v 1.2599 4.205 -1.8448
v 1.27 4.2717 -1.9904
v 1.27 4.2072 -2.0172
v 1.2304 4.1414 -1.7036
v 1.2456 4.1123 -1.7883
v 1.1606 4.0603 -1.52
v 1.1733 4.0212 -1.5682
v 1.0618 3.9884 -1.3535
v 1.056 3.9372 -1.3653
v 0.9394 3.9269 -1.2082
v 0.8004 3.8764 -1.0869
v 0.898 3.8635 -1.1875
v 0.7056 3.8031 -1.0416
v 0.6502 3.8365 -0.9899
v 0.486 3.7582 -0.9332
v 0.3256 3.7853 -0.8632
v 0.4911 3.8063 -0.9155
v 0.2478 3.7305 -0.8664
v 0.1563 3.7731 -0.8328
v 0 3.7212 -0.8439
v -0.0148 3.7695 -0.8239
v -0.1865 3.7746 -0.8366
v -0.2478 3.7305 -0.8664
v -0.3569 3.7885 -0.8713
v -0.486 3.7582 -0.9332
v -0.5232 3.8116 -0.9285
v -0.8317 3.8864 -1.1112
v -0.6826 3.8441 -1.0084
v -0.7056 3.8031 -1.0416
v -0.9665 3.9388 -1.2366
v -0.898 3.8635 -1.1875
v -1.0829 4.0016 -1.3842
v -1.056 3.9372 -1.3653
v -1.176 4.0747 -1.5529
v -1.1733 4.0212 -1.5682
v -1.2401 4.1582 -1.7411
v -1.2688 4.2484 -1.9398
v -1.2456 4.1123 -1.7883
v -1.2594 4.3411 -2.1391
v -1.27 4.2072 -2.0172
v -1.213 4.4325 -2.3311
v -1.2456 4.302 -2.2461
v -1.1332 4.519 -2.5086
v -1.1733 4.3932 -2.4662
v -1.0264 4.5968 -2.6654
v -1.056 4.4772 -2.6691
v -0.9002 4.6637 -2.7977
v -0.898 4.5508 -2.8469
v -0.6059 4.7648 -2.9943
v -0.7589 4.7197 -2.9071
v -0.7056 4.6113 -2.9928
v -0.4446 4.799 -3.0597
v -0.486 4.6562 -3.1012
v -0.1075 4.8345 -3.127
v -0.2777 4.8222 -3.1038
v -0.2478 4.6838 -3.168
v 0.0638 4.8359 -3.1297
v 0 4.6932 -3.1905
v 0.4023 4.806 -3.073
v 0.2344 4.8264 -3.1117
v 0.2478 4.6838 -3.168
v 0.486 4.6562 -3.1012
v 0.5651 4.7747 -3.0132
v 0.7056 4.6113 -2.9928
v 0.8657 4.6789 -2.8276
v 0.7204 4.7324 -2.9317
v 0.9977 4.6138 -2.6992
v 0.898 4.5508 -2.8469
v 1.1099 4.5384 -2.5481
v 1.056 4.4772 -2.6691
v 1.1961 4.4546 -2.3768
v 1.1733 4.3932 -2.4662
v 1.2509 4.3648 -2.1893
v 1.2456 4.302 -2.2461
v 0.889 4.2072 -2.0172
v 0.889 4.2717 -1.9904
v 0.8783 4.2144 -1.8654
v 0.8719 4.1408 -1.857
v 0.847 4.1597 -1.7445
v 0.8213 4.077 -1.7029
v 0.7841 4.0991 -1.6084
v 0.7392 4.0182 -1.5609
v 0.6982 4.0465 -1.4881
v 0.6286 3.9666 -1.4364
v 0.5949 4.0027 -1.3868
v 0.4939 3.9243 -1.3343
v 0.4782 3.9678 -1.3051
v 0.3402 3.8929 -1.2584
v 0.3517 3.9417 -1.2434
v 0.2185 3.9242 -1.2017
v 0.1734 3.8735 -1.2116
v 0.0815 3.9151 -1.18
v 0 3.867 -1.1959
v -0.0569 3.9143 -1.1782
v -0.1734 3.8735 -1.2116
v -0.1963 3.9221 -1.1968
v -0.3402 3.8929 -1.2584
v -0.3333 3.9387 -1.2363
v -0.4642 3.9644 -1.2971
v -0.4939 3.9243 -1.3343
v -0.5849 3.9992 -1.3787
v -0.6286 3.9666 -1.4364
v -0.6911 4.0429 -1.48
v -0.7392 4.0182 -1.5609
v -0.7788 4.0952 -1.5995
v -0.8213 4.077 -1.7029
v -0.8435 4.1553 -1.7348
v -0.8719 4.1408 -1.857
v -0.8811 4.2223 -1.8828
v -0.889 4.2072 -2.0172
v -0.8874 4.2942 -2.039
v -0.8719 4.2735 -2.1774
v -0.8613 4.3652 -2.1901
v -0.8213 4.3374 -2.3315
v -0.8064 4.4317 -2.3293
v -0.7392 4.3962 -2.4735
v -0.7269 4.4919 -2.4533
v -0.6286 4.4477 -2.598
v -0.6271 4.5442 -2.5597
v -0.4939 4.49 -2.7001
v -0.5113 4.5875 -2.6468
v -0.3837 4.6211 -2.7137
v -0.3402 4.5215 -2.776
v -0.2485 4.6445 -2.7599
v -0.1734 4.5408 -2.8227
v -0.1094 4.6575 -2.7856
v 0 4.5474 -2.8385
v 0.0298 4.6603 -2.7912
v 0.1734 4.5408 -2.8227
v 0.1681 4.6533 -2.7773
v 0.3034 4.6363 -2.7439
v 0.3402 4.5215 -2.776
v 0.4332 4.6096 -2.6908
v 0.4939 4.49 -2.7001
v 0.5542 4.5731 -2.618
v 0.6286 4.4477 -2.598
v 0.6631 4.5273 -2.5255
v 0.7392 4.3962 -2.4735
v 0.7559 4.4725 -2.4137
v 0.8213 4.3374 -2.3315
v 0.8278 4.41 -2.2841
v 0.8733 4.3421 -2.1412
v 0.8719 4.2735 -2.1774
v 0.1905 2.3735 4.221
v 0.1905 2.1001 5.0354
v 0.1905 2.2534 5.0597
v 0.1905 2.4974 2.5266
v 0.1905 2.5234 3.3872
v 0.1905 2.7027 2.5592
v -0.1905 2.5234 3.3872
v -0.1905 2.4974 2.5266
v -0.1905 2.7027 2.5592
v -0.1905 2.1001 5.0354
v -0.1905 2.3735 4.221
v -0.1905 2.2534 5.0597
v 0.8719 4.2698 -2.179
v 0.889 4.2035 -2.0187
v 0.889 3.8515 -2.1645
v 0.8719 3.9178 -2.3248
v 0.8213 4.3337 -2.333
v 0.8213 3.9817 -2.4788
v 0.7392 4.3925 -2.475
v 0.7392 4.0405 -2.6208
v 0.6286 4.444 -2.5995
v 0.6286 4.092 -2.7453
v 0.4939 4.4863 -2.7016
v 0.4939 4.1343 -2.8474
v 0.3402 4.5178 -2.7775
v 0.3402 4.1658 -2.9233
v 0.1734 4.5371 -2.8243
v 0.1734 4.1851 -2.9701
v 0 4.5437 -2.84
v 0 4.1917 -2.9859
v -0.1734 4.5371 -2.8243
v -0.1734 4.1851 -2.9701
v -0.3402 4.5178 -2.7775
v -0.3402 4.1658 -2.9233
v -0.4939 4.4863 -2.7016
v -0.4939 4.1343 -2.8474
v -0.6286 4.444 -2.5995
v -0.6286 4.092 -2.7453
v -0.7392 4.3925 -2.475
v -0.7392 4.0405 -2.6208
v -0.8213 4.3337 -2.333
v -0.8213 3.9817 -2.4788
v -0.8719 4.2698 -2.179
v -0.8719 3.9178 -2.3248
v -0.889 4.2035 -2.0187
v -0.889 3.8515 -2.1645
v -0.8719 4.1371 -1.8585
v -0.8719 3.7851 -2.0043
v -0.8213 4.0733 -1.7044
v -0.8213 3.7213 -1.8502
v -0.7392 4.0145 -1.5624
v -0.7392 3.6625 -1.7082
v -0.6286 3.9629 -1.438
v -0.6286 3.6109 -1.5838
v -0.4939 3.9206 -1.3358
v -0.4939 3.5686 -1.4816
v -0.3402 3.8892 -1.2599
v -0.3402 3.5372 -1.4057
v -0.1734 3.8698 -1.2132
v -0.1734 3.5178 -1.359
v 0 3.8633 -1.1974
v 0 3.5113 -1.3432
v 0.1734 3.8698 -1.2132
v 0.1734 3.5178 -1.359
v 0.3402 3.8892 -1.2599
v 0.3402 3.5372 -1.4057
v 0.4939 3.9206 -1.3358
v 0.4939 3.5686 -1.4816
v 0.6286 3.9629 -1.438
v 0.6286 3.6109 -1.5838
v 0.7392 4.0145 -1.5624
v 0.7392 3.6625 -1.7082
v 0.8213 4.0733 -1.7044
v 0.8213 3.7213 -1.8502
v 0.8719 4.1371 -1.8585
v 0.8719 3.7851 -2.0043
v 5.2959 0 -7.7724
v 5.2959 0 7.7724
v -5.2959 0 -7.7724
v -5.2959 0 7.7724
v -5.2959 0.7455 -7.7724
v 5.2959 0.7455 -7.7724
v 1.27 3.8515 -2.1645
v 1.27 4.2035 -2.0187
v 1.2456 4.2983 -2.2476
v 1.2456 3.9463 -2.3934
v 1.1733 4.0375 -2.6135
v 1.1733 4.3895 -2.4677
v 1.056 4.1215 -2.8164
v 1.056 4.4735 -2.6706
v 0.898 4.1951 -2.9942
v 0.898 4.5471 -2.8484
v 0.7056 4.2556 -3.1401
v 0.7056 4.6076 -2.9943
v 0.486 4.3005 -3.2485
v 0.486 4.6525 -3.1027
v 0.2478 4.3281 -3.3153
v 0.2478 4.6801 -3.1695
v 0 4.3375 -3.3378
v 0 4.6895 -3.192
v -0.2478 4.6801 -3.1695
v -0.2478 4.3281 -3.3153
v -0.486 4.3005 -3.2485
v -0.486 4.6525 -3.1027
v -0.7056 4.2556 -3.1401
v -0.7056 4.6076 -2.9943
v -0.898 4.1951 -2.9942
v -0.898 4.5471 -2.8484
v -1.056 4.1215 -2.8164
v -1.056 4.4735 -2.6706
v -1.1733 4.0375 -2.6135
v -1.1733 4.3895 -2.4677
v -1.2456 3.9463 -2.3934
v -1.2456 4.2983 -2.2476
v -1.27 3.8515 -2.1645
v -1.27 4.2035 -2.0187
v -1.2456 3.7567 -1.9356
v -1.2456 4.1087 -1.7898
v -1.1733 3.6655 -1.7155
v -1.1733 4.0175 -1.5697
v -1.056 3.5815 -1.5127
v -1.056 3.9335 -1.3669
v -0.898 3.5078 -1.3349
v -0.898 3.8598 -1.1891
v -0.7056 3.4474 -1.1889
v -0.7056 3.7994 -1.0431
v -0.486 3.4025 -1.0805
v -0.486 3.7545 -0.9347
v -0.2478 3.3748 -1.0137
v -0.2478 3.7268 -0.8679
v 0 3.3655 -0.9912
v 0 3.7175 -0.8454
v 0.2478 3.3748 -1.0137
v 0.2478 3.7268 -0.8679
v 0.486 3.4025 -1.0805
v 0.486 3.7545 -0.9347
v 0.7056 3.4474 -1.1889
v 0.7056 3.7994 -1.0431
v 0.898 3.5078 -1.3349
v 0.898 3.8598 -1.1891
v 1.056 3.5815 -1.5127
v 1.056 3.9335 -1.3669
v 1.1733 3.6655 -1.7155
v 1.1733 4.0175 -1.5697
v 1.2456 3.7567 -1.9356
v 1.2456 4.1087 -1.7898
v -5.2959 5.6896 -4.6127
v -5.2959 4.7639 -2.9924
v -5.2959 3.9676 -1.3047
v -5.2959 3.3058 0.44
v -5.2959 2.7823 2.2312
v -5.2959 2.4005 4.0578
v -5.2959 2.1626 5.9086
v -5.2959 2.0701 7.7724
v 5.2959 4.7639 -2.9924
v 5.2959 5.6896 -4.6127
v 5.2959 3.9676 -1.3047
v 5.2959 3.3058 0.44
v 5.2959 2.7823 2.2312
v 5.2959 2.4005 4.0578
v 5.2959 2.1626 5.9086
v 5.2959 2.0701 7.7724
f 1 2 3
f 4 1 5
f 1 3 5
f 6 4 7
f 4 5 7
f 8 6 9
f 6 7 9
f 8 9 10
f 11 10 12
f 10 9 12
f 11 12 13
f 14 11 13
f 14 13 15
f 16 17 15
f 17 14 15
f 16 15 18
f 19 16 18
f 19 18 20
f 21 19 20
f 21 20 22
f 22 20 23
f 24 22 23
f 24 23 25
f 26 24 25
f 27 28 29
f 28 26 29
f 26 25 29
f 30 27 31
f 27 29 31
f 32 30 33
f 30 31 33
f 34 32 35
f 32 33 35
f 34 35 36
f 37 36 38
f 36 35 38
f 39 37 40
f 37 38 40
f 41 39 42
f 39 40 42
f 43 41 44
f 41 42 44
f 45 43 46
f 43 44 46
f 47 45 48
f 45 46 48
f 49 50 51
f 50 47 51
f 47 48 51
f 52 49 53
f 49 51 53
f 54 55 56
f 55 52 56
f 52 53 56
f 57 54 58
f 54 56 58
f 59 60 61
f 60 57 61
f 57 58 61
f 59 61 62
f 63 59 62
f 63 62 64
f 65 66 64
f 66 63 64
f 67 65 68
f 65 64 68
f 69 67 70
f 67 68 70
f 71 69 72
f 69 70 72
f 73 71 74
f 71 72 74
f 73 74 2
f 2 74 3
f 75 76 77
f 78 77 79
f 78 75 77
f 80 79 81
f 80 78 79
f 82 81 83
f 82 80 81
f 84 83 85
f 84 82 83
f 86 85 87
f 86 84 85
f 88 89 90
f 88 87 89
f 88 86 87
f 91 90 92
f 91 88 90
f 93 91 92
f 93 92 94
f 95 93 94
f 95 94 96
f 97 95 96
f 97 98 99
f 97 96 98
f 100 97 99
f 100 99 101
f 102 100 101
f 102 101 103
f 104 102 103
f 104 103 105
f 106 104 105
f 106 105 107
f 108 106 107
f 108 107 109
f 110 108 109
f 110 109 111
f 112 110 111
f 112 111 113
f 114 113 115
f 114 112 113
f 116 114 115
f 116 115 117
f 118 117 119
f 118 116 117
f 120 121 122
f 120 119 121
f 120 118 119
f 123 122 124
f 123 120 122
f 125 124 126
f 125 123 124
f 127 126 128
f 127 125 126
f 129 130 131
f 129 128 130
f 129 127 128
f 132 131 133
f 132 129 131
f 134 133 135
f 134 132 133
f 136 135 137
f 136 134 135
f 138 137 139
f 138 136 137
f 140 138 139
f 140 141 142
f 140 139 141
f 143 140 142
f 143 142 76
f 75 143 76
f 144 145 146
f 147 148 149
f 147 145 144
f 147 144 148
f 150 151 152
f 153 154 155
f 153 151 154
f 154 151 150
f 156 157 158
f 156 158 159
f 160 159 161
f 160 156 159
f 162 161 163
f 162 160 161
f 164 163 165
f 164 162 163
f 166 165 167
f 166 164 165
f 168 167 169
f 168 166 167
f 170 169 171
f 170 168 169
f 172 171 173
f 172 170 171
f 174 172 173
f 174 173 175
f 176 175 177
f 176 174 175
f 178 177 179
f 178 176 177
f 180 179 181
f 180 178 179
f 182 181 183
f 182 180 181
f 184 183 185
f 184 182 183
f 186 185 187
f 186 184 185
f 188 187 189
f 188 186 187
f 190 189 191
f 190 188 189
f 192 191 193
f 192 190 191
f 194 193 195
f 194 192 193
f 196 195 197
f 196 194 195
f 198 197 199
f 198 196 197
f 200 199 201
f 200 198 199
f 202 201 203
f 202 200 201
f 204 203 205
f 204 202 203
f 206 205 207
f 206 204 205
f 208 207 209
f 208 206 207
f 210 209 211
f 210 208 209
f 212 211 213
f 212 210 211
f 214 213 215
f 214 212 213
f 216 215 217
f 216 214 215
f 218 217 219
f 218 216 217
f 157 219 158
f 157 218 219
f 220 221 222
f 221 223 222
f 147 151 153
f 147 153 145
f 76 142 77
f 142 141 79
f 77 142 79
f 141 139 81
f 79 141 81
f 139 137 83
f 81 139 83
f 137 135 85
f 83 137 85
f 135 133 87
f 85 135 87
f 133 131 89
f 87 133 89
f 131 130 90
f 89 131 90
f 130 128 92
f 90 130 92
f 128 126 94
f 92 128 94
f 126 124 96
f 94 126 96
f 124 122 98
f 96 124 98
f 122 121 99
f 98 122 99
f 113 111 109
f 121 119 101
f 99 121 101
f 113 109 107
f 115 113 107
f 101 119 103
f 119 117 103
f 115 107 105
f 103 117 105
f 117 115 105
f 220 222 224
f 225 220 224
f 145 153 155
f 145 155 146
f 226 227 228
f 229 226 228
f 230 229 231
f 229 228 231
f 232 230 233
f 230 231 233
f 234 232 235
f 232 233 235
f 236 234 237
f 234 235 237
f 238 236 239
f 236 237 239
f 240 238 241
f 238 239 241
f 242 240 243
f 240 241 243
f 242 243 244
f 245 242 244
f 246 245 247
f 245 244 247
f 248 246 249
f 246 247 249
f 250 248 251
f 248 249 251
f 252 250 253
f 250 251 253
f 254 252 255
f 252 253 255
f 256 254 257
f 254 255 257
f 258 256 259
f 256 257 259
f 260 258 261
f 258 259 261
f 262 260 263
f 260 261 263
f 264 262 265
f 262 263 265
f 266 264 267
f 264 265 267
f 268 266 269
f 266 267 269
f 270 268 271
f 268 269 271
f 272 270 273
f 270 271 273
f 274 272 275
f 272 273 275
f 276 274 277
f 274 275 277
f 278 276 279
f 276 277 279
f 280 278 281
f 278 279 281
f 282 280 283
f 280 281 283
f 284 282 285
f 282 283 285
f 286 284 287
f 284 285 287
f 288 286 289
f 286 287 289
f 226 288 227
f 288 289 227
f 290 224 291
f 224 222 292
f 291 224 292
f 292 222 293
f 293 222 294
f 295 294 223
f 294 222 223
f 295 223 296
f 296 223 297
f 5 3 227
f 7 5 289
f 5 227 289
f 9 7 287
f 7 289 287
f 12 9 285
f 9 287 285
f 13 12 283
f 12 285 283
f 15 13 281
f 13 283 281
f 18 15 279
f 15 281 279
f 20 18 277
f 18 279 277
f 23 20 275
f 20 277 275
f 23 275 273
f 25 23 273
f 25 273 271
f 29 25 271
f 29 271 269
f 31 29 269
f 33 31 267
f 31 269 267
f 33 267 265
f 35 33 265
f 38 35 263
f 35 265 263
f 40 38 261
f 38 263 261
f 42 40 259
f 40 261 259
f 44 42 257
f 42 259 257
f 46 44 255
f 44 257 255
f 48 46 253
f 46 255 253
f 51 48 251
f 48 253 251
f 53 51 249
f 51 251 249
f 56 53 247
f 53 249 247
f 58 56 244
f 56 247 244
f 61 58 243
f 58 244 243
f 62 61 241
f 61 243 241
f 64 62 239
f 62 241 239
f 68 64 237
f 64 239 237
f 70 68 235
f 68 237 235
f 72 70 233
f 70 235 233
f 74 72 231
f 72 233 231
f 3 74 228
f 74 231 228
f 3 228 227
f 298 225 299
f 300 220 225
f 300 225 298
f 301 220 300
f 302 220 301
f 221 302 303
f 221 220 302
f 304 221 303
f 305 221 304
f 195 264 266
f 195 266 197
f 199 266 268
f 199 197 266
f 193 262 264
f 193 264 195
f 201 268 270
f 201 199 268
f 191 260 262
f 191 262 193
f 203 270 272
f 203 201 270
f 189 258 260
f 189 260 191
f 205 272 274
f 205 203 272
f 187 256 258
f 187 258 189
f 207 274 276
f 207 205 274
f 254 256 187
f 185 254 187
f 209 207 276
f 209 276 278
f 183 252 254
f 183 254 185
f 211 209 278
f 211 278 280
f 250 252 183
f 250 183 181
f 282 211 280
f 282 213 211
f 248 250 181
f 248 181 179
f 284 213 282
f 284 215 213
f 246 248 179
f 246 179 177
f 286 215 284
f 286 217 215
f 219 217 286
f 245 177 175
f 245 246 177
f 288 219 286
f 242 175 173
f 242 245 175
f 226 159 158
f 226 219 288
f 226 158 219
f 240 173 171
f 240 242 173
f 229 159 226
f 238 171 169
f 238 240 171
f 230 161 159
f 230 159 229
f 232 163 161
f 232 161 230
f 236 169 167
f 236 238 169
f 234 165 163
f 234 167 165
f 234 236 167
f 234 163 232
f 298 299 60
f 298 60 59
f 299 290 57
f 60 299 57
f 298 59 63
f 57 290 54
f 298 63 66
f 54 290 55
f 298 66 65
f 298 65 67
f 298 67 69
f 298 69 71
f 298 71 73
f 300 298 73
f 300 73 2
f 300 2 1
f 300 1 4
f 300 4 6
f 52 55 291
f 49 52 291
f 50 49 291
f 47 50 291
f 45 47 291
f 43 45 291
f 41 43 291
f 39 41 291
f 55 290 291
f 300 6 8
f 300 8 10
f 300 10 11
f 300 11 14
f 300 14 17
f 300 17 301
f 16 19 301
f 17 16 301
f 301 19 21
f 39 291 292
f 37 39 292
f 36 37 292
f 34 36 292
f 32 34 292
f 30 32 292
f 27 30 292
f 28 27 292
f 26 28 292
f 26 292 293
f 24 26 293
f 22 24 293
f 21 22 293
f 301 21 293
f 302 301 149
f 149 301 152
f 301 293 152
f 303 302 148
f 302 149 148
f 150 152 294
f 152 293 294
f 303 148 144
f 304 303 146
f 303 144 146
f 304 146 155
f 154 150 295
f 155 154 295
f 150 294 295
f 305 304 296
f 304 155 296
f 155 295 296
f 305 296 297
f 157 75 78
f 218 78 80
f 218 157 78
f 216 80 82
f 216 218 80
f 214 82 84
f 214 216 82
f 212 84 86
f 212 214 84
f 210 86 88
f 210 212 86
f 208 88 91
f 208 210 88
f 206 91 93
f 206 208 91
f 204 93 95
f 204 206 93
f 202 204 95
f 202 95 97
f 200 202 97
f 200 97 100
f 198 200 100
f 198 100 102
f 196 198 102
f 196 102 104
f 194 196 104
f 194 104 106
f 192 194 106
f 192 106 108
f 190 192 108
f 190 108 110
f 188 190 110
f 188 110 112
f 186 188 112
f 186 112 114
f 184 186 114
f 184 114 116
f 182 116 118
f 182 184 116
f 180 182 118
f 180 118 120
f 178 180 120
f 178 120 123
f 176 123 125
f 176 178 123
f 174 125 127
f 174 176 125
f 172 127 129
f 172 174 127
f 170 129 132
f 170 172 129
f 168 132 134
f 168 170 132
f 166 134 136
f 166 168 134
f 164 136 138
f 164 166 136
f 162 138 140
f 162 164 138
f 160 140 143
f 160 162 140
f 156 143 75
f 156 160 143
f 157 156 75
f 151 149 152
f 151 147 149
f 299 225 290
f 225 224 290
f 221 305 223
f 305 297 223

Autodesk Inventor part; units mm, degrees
sketch "Sketch_2" plane through (0, 0, 0) normal (1, 0, 0) x (0, 1, 0)
  line L0 (2.0701, 7.7724) -> (0, 7.7724)
  line L1 (0, 7.7724) -> (0, -7.7724)
  line L2 (0, -7.7724) -> (0.7455, -7.7724)
  line L3 (0.7455, -7.7724) -> (5.6896, -4.6127)
  arc A0 (2.0701, 7.7724) -> (5.6896, -4.6127) centre (25.9234, 8.0219) ccw
extrude "Extrusion1" add sketch "Sketch_2" along normal mid plane 10.5918
sketch "Sketch_3" plane through (0, 3.2333, 0.3287) normal (0, 0.9239, 0.3827) x (1, 0, 0)
  circle A0 centre (0, 2.54) radius 1.27
  circle A1 centre (0, 2.54) radius 0.889
extrude "Extrusion2" cut sketch "Sketch_3" along normal mid plane 0.762
sketch "Sketch_4" plane through (0, 3.2333, 0.3287) normal (0, 0.9877, 0.1564) x (1, 0, 0)
  line L0 (-0.1905, -4.826) -> (0.1905, -4.826)
  line L1 (0.1905, -4.826) -> (0.1905, -2.286)
  line L2 (0.1905, -2.286) -> (-0.1905, -2.286)
  line L3 (-0.1905, -2.286) -> (-0.1905, -4.826)
extrude "Extrusion3" cut sketch "Sketch_4" along normal mid plane 0.762
ref_plane "to_body_XY" through (0, 0, 0) normal (0, 1, 0) x (1, 0, 0)
ref_plane "to_body_YZ" through (0, 0, 0) normal (1, 0, 0) x (0, 0, -1)
ref_plane "to_body_ZX" through (0, 0, 0) normal (0, 0, -1) x (0, 1, 0)
properties part number "CWSB2-nonillumin_rocker"
